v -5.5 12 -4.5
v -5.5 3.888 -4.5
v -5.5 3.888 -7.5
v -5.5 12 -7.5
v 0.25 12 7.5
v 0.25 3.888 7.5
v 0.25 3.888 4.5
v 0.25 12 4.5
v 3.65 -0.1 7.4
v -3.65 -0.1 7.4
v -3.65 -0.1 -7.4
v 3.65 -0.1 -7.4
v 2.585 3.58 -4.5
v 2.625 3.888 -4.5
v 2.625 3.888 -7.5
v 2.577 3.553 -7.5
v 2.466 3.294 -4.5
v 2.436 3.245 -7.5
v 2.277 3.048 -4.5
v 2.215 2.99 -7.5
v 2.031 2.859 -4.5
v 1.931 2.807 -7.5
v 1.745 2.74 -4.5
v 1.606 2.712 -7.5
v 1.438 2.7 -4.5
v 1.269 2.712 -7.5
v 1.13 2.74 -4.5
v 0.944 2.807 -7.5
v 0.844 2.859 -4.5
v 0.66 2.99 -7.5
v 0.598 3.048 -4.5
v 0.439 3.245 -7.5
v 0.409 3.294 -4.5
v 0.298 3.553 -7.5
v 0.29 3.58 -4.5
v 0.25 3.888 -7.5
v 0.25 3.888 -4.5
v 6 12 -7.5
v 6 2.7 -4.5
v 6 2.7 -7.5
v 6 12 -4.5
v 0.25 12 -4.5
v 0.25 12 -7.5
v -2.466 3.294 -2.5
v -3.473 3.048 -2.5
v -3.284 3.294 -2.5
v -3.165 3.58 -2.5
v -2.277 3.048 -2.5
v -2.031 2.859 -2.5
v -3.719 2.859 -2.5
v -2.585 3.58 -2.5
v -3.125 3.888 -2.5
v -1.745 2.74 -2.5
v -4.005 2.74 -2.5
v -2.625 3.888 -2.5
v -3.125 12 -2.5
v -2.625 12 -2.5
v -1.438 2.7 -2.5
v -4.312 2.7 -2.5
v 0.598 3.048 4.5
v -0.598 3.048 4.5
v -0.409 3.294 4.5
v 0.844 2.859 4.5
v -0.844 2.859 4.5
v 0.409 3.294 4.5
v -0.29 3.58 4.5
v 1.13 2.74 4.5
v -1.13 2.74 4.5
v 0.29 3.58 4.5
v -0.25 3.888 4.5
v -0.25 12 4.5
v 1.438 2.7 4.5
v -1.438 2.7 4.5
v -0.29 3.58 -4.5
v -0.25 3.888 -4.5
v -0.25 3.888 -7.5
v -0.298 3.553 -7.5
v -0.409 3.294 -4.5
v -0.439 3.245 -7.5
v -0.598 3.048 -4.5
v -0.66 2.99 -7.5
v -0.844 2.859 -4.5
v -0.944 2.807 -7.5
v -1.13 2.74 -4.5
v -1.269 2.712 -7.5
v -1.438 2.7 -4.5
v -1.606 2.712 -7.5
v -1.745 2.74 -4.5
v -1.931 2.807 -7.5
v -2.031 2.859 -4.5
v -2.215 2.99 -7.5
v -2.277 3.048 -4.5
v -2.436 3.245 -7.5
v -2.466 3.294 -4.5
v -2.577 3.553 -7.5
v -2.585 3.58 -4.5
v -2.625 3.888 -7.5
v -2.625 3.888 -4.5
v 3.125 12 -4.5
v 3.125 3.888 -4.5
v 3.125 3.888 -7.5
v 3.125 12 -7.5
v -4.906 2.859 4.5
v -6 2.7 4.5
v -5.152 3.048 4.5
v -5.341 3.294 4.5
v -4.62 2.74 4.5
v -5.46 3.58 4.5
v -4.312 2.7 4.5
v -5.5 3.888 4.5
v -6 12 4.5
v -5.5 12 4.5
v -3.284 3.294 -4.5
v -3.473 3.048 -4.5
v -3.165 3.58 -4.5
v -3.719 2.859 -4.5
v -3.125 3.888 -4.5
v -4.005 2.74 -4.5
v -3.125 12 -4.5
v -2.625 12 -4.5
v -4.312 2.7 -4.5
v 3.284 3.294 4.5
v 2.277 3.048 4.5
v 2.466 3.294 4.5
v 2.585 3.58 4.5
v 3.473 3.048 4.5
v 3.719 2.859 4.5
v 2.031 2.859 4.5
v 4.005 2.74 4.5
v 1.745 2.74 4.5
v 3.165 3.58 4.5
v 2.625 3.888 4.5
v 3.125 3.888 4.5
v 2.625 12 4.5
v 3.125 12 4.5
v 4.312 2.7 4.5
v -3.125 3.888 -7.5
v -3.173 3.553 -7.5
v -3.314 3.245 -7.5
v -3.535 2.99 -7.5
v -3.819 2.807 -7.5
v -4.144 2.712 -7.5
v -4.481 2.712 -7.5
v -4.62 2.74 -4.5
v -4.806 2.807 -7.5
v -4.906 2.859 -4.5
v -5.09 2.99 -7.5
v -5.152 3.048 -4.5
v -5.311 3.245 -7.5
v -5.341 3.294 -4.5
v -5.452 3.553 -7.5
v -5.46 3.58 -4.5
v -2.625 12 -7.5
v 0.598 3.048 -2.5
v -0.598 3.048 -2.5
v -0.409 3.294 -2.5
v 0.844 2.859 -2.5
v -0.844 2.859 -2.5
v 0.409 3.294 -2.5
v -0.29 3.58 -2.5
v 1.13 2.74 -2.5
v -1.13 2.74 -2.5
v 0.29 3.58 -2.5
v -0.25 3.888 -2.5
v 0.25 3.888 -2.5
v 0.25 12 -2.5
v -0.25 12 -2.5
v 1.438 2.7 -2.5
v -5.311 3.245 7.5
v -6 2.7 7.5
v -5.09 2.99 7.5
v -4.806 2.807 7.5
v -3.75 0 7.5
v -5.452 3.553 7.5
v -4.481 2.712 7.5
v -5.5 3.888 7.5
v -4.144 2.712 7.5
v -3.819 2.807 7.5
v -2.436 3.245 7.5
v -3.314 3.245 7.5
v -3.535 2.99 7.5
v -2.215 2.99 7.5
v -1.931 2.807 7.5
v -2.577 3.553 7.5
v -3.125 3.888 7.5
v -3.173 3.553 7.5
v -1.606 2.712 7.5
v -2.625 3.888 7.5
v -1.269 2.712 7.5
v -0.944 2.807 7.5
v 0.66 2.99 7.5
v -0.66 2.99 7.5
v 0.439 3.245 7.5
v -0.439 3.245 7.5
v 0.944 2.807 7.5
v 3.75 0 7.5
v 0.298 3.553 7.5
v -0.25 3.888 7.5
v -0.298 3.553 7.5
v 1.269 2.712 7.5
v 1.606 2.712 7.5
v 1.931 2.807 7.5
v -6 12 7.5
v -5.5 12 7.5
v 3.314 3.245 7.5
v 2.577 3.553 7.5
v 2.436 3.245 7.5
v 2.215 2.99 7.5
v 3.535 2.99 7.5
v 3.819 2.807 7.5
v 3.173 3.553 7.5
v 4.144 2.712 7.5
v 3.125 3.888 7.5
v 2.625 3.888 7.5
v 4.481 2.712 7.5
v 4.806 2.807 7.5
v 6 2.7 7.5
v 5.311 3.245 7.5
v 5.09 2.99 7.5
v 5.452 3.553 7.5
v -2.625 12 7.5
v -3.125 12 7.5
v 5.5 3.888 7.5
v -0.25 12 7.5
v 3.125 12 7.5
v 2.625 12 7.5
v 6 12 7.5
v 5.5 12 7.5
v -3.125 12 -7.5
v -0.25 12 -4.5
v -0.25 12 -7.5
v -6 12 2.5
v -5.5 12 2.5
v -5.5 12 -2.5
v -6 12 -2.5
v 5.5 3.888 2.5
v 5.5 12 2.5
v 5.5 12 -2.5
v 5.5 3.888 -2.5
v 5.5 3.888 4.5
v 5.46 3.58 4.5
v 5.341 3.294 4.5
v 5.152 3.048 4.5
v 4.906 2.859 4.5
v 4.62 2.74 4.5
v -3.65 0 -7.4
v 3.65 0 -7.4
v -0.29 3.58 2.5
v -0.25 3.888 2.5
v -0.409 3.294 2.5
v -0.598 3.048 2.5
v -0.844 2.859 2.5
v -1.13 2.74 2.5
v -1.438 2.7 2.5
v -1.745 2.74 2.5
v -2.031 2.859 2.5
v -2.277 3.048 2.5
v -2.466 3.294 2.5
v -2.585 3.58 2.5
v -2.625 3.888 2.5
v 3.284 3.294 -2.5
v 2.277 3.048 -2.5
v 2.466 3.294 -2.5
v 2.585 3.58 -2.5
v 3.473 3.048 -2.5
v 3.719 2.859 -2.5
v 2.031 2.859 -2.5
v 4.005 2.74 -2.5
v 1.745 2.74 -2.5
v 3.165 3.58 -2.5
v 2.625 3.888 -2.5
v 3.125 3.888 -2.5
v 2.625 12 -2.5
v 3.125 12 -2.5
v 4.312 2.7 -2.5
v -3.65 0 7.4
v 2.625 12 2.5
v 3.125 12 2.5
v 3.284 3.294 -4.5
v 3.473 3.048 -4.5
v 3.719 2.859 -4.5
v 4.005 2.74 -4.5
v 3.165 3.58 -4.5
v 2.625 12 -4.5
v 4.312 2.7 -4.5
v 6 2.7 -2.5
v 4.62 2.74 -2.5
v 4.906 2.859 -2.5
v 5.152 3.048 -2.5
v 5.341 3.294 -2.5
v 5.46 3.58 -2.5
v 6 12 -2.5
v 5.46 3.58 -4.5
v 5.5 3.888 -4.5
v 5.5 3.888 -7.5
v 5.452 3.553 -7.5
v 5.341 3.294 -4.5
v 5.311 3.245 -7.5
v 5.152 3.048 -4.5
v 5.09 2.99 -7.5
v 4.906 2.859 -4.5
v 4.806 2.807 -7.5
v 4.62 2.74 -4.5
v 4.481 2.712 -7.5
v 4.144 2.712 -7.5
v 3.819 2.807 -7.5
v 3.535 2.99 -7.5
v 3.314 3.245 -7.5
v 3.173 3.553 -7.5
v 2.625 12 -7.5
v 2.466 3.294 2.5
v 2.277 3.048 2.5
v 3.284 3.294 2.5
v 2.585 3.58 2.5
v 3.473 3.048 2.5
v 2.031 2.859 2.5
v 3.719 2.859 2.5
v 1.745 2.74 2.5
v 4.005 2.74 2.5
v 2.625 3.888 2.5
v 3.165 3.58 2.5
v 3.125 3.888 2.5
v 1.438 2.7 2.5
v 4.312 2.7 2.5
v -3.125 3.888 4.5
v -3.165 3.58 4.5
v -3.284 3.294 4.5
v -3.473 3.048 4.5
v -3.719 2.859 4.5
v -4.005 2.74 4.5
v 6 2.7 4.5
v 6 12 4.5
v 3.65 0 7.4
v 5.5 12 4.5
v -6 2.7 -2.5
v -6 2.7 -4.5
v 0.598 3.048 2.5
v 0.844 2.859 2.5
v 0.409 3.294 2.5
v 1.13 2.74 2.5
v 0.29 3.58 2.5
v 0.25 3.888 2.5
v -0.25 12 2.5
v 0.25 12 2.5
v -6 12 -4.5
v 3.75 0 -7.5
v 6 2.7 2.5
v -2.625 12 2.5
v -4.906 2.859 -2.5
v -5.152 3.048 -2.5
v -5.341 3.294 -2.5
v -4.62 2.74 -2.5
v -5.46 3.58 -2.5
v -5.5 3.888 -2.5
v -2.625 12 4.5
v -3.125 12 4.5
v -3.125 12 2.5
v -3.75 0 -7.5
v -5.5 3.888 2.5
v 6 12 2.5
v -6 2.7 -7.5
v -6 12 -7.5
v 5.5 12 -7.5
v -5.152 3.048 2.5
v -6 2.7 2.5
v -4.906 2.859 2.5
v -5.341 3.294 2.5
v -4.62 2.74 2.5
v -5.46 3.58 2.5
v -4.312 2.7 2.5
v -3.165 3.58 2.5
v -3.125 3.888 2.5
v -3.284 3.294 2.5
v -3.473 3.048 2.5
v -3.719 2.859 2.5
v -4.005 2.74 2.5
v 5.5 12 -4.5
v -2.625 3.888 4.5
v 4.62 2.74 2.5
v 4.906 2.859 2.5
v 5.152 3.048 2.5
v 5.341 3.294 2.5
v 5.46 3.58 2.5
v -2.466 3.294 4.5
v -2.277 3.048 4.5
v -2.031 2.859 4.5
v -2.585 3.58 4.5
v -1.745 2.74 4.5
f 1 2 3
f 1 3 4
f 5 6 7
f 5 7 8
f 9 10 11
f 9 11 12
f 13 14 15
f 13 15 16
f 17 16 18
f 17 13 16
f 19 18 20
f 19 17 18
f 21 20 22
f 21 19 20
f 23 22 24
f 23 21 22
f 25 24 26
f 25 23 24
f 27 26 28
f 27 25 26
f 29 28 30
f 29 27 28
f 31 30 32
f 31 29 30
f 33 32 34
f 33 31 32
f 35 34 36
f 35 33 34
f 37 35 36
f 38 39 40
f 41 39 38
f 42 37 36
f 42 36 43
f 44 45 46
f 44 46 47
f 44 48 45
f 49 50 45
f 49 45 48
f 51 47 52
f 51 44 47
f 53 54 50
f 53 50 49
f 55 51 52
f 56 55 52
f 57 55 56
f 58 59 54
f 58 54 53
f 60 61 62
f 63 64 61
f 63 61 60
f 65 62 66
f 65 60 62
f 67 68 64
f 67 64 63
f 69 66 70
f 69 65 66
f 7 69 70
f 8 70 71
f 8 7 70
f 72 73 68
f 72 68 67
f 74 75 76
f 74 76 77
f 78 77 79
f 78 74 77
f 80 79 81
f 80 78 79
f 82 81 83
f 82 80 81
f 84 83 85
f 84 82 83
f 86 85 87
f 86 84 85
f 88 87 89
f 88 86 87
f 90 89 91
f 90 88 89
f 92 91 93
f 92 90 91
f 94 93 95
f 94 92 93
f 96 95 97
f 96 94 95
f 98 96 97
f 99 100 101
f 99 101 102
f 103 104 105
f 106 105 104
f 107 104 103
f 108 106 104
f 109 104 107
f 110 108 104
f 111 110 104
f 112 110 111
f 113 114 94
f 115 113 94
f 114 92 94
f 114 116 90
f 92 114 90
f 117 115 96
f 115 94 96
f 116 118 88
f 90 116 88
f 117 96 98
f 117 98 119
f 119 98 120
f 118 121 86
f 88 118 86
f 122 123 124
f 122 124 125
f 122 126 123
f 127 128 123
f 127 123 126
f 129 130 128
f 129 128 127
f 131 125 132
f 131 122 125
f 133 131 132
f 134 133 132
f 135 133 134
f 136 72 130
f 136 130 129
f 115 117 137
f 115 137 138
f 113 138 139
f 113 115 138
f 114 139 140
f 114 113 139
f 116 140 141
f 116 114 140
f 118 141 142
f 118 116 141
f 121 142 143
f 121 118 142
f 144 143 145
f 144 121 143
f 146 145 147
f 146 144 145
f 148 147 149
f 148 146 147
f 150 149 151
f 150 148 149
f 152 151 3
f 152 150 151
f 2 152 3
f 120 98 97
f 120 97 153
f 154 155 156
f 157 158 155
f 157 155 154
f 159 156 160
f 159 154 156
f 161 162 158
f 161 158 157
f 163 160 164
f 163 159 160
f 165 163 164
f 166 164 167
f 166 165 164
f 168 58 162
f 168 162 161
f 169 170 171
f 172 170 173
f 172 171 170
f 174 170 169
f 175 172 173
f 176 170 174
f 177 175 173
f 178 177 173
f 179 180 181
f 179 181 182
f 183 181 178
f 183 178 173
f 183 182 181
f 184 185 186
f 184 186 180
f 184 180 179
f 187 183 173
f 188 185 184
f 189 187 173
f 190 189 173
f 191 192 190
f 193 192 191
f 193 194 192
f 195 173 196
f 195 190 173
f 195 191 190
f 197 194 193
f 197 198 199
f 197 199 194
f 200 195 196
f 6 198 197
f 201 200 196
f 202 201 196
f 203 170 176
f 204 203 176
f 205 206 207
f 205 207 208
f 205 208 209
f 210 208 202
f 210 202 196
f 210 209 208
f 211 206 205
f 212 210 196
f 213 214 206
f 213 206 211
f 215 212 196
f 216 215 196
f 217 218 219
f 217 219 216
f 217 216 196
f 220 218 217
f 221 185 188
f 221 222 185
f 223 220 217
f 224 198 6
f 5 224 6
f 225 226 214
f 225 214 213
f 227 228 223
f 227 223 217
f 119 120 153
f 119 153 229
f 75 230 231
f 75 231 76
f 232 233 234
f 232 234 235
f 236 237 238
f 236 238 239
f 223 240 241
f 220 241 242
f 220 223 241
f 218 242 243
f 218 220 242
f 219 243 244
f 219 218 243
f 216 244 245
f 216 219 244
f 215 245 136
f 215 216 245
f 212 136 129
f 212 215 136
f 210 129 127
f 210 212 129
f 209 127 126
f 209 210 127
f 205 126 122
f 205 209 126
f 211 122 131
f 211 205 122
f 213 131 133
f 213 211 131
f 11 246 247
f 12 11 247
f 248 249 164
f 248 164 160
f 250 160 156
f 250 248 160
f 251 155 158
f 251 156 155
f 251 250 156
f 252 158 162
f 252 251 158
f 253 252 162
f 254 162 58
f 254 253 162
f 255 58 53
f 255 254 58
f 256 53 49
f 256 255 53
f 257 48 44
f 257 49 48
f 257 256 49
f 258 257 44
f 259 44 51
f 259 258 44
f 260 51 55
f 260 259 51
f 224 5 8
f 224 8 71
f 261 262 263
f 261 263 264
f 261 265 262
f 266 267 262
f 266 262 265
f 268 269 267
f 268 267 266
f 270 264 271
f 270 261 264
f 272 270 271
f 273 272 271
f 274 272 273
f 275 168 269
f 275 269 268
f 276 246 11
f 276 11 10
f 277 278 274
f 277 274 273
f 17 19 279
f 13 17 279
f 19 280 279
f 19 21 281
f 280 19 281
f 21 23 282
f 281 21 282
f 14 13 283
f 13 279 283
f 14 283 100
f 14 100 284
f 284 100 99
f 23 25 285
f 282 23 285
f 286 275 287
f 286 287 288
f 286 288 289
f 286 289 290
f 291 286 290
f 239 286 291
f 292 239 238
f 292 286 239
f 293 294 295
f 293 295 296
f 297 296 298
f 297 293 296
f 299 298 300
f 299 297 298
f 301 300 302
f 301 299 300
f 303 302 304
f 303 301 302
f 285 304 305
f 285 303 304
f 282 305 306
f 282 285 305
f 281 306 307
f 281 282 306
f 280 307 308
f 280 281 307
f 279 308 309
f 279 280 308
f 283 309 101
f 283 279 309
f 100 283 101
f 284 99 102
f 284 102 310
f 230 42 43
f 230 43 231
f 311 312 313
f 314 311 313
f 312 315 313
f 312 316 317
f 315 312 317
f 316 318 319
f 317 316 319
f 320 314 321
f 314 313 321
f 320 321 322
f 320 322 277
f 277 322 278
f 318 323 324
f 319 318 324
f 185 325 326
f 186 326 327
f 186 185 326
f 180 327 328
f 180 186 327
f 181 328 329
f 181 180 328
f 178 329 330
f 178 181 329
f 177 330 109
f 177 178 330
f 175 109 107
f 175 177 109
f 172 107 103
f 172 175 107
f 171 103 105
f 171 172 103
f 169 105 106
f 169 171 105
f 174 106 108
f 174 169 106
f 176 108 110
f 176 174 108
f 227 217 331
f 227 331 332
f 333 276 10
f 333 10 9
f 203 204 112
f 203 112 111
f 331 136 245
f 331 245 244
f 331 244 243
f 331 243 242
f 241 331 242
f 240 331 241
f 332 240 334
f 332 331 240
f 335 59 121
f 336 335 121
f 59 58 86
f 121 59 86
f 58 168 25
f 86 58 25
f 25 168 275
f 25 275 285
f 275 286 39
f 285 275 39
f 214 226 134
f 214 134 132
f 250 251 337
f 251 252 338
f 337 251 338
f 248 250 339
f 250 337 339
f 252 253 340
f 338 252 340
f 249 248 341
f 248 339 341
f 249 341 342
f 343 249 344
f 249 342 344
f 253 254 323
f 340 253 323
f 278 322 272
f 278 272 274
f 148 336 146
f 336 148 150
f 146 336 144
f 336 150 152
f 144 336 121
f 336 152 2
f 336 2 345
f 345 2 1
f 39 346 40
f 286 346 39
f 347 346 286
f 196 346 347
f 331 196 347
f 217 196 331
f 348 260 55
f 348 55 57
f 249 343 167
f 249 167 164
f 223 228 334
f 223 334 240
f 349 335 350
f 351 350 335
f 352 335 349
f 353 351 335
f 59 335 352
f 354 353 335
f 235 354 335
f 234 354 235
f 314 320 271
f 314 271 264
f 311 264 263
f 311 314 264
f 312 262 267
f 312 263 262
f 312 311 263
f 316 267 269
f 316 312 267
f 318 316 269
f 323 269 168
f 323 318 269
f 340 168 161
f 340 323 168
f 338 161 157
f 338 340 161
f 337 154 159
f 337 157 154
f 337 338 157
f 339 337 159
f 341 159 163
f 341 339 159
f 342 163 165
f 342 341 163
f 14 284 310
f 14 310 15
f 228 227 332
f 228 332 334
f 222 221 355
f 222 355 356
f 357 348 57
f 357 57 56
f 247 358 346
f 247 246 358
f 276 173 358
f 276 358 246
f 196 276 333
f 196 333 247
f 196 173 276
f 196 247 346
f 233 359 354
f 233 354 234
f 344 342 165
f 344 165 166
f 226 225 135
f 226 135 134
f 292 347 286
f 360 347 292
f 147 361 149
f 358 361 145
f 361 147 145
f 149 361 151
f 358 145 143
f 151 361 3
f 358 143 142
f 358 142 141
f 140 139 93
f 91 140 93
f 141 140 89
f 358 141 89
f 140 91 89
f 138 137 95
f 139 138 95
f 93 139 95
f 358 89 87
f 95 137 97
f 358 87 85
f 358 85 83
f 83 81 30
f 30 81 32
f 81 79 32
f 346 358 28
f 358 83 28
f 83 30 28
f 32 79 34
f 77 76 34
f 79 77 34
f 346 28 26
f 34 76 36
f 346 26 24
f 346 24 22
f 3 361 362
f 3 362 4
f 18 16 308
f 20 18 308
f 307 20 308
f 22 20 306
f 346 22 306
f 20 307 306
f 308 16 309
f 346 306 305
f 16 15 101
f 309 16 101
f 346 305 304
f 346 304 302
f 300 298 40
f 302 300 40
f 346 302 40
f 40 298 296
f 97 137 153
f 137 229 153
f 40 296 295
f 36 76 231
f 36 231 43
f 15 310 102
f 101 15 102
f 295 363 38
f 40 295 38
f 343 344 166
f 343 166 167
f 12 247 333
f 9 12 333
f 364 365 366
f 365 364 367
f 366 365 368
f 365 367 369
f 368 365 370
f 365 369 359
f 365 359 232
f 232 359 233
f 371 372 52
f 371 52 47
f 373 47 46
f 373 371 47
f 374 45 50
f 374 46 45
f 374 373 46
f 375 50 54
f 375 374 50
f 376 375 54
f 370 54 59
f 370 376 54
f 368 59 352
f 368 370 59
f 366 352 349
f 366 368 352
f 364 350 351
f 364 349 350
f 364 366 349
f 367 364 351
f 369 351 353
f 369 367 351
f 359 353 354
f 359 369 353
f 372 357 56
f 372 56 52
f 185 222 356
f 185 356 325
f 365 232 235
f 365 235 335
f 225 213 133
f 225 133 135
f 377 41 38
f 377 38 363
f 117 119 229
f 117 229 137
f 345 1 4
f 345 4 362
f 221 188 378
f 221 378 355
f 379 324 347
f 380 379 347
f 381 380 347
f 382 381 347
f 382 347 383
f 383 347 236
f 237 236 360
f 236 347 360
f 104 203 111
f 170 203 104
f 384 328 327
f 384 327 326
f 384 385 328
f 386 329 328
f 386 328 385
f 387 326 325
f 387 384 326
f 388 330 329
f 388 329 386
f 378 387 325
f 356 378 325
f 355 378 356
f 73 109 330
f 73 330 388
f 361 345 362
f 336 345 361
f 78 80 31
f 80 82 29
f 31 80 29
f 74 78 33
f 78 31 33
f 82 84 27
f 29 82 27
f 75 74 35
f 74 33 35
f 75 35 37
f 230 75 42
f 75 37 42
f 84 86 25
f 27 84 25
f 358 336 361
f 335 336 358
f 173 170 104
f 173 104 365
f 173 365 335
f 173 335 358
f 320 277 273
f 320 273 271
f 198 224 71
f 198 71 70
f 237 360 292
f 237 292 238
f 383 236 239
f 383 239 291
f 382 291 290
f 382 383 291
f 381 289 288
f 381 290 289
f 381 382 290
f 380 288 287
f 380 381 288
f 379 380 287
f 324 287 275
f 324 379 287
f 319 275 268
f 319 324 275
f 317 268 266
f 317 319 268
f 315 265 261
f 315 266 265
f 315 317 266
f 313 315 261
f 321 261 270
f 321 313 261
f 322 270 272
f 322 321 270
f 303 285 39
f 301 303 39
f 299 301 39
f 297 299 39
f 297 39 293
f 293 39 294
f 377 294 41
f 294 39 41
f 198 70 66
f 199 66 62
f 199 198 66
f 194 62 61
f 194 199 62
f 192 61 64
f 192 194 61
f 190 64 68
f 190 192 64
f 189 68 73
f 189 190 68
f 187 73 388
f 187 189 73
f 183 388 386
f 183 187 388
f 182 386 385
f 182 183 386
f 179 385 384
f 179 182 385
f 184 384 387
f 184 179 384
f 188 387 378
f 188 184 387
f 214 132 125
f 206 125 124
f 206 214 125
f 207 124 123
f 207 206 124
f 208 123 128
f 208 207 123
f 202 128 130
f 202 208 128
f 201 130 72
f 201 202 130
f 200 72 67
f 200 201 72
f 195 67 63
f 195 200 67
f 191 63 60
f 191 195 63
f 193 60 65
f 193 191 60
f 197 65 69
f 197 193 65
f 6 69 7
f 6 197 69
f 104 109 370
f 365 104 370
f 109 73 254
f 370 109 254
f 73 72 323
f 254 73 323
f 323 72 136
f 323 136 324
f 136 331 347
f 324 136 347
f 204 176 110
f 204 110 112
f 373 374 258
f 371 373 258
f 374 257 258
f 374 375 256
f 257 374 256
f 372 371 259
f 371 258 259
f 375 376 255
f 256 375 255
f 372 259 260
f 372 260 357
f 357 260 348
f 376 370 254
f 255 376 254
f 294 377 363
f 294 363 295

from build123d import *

# Parameters (mm, degrees)
AUFSATZ_LINEAR_AUSTRAGEN1_DEPTH = 7.5
SCHNITT_LINEAR_AUSTRAGEN1_DEPTH = 15
SCHNITT_LINEAR_AUSTRAGEN2_REACH = 20.554
SKIZZE3_W                       = 2
SKIZZE3_H                       = 9.3
SKIZZE4_W                       = 7.3
SKIZZE4_H                       = 14.8
AUFSATZ_LINEAR_AUSTRAGEN2_DEPTH = 0.1


with BuildPart() as part:
    # Skizze1 → Aufsatz-Linear austragen1 (new, symmetric)
    with BuildSketch(Plane.XY):
        Polygon((-6, 12), (-6, 2.7), (-3.75, 0), (3.75, 0), (6, 2.7), (6, 12), align=None)
    extrude(amount=AUFSATZ_LINEAR_AUSTRAGEN1_DEPTH, both=True)

    # Skizze2 → Schnitt-Linear austragen1 (cut)
    with BuildSketch(Plane.XY.offset(7.5)):
        with BuildLine():
            Line((-3.125, 12), (-3.125, 3.8875))
            ThreePointArc((-3.125, 3.8875), (-4.3125, 2.7), (-5.5, 3.8875))
            Line((-5.5, 3.8875), (-5.5, 12))
            ThreePointArc((-5.5, 12), (-4.3125, 13.1875), (-3.125, 12))
        make_face()
        with BuildLine():
            Line((-0.25, 12), (-0.25, 3.8875))
            ThreePointArc((-0.25, 3.8875), (-1.4375, 2.7), (-2.625, 3.8875))
            Line((-2.625, 3.8875), (-2.625, 12))
            ThreePointArc((-2.625, 12), (-1.4375, 13.1875), (-0.25, 12))
        make_face()
        with BuildLine():
            Line((2.625, 12), (2.625, 3.8875))
            ThreePointArc((2.625, 3.8875), (1.4375, 2.7), (0.25, 3.8875))
            Line((0.25, 3.8875), (0.25, 12))
            ThreePointArc((0.25, 12), (1.4375, 13.1875), (2.625, 12))
        make_face()
        with BuildLine():
            Line((5.5, 12), (5.5, 3.8875))
            ThreePointArc((5.5, 3.8875), (4.3125, 2.7), (3.125, 3.8875))
            Line((3.125, 3.8875), (3.125, 12))
            ThreePointArc((3.125, 12), (4.3125, 13.1875), (5.5, 12))
        make_face()
    extrude(amount=-SCHNITT_LINEAR_AUSTRAGEN1_DEPTH, mode=Mode.SUBTRACT)

    # Schnitt-Linear austragen2: up to this face of the body (flat: up to its plane)
    schnitt_linear_austragen2_end = Plane(part.part.faces().sort_by_distance((-6, 7.35, 0))[0])
    # Skizze3 → Schnitt-Linear austragen2 (cut, up to the picked face)
    with BuildSketch(Plane(origin=(6, 0, 0), x_dir=(0, 0, -1), z_dir=(1, 0, 0)), mode=Mode.PRIVATE) as schnitt_linear_austragen2_sk1:
        with Locations((-3.5, 7.35)):
            Rectangle(SKIZZE3_W, SKIZZE3_H)
    schnitt_linear_austragen2_tool1 = split(extrude(schnitt_linear_austragen2_sk1.sketch, amount=-SCHNITT_LINEAR_AUSTRAGEN2_REACH, mode=Mode.PRIVATE), bisect_by=schnitt_linear_austragen2_end, keep=Keep.BOTH, mode=Mode.PRIVATE)
    # Skizze3 → Schnitt-Linear austragen2 (cut, up to the picked face)
    with BuildSketch(Plane(origin=(6, 0, 0), x_dir=(0, 0, -1), z_dir=(1, 0, 0)), mode=Mode.PRIVATE) as schnitt_linear_austragen2_sk2:
        with Locations((3.5, 7.35)):
            Rectangle(SKIZZE3_W, SKIZZE3_H)
    schnitt_linear_austragen2_tool2 = split(extrude(schnitt_linear_austragen2_sk2.sketch, amount=-SCHNITT_LINEAR_AUSTRAGEN2_REACH, mode=Mode.PRIVATE), bisect_by=schnitt_linear_austragen2_end, keep=Keep.BOTH, mode=Mode.PRIVATE)
    # Skizze3 → Schnitt-Linear austragen2 (cut, up to the picked face)
    with BuildSketch(Plane(origin=(6, 0, 0), x_dir=(0, 0, -1), z_dir=(1, 0, 0)), mode=Mode.PRIVATE) as schnitt_linear_austragen2_sk3:
        with Locations((10.5, 7.35)):
            Rectangle(SKIZZE3_W, SKIZZE3_H)
    schnitt_linear_austragen2_tool3 = split(extrude(schnitt_linear_austragen2_sk3.sketch, amount=-SCHNITT_LINEAR_AUSTRAGEN2_REACH, mode=Mode.PRIVATE), bisect_by=schnitt_linear_austragen2_end, keep=Keep.BOTH, mode=Mode.PRIVATE)
    # Skizze3 → Schnitt-Linear austragen2 (cut, up to the picked face)
    with BuildSketch(Plane(origin=(6, 0, 0), x_dir=(0, 0, -1), z_dir=(1, 0, 0)), mode=Mode.PRIVATE) as schnitt_linear_austragen2_sk4:
        with Locations((17.5, 7.35)):
            Rectangle(SKIZZE3_W, SKIZZE3_H)
    schnitt_linear_austragen2_tool4 = split(extrude(schnitt_linear_austragen2_sk4.sketch, amount=-SCHNITT_LINEAR_AUSTRAGEN2_REACH, mode=Mode.PRIVATE), bisect_by=schnitt_linear_austragen2_end, keep=Keep.BOTH, mode=Mode.PRIVATE)
    add(schnitt_linear_austragen2_tool1.solids().sort_by(Axis((6, 7.35, 3.5), (-1, 0, 0)))[0], mode=Mode.SUBTRACT)
    add(schnitt_linear_austragen2_tool2.solids().sort_by(Axis((6, 7.35, -3.5), (-1, 0, 0)))[0], mode=Mode.SUBTRACT)
    add(schnitt_linear_austragen2_tool3.solids().sort_by(Axis((6, 7.35, -10.5), (-1, 0, 0)))[0], mode=Mode.SUBTRACT)
    add(schnitt_linear_austragen2_tool4.solids().sort_by(Axis((6, 7.35, -17.5), (-1, 0, 0)))[0], mode=Mode.SUBTRACT)

    # Skizze4 → Aufsatz-Linear austragen2 (add)
    with BuildSketch(Plane.XZ):
        Rectangle(SKIZZE4_W, SKIZZE4_H)
    extrude(amount=AUFSATZ_LINEAR_AUSTRAGEN2_DEPTH)


solid = part.part
